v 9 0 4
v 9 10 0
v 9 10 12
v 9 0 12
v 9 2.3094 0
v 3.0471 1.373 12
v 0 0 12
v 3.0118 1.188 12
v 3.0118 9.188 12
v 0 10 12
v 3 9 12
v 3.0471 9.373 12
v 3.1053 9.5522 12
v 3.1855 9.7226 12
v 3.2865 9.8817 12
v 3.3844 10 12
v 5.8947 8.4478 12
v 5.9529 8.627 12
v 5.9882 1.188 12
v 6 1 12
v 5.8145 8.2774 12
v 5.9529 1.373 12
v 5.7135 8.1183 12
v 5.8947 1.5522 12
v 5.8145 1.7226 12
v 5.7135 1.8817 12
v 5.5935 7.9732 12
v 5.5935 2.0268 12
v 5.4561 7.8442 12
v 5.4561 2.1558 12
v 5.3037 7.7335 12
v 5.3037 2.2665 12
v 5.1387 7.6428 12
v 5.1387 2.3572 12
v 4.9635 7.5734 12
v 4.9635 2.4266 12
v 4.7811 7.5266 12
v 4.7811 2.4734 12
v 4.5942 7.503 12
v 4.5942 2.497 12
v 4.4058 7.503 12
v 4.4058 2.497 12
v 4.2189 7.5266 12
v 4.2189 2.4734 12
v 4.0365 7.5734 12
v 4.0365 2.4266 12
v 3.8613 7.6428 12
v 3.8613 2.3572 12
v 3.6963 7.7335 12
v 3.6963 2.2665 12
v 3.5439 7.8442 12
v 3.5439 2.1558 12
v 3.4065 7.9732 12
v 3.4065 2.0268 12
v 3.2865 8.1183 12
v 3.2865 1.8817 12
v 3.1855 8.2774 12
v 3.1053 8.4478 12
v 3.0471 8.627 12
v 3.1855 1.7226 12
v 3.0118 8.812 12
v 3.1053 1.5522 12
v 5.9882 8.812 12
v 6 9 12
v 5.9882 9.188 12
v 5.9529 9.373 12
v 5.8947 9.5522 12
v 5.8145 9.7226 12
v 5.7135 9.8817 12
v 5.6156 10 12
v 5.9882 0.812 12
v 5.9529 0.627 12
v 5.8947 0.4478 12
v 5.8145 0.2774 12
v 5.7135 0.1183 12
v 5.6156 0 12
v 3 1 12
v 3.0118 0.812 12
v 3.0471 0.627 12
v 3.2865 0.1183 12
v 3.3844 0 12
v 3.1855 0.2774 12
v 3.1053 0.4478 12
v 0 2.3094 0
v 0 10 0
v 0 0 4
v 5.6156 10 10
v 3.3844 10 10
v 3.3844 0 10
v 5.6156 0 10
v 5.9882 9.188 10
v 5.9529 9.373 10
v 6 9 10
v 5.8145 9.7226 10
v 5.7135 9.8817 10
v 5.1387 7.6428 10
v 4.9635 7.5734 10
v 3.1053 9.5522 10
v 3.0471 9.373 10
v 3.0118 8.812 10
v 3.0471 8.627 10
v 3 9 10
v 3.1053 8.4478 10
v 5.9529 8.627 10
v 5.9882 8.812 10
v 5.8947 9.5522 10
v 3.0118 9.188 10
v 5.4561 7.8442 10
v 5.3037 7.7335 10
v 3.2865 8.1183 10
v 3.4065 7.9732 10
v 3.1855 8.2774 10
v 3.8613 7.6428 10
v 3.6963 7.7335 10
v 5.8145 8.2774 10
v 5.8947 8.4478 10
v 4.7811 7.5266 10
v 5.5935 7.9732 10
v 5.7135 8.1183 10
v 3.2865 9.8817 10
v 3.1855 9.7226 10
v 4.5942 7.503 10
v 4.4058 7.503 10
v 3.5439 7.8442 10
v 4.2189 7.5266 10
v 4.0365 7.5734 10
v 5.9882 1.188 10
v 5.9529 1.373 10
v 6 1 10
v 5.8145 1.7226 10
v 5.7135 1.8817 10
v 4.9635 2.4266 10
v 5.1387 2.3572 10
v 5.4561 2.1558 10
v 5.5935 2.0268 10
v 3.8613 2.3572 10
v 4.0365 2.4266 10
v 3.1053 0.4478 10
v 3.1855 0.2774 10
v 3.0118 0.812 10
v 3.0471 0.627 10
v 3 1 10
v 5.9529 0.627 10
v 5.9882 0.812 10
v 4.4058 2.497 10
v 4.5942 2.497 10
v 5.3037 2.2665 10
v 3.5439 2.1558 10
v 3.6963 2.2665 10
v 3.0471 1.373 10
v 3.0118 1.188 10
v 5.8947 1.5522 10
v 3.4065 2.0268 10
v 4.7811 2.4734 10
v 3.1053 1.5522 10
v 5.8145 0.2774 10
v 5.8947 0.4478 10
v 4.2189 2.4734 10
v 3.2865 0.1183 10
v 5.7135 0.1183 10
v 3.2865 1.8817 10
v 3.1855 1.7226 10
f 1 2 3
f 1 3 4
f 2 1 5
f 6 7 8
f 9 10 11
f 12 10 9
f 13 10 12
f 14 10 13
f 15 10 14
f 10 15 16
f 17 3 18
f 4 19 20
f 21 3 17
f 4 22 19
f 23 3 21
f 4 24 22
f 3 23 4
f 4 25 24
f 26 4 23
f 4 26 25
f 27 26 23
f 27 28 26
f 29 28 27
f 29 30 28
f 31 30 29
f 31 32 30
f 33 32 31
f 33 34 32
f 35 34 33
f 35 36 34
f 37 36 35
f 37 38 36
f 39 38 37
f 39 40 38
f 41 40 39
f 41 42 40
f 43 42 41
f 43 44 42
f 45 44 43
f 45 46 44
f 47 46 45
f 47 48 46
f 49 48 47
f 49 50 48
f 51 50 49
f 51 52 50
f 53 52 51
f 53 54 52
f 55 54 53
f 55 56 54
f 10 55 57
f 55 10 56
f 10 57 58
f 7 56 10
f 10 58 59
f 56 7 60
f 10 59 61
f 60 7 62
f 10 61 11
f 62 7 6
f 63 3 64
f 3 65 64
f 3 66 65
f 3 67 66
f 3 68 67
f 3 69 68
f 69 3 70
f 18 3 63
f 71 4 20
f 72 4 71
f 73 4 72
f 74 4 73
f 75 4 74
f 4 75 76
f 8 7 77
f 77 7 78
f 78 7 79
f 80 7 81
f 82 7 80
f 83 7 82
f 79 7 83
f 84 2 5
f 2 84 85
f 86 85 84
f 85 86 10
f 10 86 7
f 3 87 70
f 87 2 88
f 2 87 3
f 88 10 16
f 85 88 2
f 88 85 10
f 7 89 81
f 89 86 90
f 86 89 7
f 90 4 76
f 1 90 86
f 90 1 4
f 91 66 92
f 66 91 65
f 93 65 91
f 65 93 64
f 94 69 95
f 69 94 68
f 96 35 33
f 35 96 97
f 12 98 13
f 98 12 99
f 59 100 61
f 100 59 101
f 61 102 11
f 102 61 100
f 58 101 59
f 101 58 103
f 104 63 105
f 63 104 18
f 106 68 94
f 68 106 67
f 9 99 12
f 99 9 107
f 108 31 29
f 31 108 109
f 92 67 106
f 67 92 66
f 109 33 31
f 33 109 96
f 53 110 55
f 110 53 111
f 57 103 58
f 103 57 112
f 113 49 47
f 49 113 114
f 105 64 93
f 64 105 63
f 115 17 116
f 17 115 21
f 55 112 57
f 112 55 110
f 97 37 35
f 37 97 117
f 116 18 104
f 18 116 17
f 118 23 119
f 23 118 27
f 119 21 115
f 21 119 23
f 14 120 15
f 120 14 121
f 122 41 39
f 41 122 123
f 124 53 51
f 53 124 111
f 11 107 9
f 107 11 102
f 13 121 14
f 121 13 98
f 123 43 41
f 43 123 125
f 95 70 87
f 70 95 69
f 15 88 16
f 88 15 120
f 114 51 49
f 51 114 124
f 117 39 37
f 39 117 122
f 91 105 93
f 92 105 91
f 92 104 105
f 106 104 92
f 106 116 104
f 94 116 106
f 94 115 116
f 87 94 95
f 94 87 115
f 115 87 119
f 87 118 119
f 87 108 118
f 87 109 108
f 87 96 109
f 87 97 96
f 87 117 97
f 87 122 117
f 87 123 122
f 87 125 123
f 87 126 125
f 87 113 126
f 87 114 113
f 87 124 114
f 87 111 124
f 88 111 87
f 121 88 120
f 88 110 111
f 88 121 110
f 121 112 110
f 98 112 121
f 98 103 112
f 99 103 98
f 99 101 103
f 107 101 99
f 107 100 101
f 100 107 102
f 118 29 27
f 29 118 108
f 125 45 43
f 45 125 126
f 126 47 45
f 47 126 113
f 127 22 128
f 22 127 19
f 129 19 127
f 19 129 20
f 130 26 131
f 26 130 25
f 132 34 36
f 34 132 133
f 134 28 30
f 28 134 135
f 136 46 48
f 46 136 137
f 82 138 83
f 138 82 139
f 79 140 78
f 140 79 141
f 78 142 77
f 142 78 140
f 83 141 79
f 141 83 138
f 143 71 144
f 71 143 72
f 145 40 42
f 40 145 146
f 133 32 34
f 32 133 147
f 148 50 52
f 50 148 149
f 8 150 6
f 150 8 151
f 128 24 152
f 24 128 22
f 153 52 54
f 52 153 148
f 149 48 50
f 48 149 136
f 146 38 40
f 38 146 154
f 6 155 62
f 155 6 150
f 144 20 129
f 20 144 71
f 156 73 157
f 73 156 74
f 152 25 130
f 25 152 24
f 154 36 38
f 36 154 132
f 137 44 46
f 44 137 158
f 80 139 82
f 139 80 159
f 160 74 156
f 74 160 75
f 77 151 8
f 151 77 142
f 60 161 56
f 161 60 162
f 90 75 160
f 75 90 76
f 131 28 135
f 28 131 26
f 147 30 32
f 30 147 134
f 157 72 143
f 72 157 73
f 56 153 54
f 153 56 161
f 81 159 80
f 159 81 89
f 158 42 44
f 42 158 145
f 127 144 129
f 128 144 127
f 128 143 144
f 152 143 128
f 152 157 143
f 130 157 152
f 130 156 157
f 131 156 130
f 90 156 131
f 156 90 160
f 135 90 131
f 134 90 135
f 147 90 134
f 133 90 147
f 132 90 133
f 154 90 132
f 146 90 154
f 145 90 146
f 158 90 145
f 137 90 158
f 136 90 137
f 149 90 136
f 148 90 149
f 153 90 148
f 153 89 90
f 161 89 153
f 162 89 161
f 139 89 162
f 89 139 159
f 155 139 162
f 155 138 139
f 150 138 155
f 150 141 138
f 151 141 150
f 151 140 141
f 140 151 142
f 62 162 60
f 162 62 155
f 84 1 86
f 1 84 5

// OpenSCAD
$fn = 50;
w = 9;
d = 10;
//h = 17;
//h = 7;
h = 12;

difference() {
cube([w,d,h]);
translate([w/2,d-1,h-2]) cylinder(2,1.5,1.5);
translate([w/2,1,h-2]) cylinder(2,1.5,1.5);
    rotate([30,0,0])translate([0,-d+2,-2])  cube([w,d,h]);
}
